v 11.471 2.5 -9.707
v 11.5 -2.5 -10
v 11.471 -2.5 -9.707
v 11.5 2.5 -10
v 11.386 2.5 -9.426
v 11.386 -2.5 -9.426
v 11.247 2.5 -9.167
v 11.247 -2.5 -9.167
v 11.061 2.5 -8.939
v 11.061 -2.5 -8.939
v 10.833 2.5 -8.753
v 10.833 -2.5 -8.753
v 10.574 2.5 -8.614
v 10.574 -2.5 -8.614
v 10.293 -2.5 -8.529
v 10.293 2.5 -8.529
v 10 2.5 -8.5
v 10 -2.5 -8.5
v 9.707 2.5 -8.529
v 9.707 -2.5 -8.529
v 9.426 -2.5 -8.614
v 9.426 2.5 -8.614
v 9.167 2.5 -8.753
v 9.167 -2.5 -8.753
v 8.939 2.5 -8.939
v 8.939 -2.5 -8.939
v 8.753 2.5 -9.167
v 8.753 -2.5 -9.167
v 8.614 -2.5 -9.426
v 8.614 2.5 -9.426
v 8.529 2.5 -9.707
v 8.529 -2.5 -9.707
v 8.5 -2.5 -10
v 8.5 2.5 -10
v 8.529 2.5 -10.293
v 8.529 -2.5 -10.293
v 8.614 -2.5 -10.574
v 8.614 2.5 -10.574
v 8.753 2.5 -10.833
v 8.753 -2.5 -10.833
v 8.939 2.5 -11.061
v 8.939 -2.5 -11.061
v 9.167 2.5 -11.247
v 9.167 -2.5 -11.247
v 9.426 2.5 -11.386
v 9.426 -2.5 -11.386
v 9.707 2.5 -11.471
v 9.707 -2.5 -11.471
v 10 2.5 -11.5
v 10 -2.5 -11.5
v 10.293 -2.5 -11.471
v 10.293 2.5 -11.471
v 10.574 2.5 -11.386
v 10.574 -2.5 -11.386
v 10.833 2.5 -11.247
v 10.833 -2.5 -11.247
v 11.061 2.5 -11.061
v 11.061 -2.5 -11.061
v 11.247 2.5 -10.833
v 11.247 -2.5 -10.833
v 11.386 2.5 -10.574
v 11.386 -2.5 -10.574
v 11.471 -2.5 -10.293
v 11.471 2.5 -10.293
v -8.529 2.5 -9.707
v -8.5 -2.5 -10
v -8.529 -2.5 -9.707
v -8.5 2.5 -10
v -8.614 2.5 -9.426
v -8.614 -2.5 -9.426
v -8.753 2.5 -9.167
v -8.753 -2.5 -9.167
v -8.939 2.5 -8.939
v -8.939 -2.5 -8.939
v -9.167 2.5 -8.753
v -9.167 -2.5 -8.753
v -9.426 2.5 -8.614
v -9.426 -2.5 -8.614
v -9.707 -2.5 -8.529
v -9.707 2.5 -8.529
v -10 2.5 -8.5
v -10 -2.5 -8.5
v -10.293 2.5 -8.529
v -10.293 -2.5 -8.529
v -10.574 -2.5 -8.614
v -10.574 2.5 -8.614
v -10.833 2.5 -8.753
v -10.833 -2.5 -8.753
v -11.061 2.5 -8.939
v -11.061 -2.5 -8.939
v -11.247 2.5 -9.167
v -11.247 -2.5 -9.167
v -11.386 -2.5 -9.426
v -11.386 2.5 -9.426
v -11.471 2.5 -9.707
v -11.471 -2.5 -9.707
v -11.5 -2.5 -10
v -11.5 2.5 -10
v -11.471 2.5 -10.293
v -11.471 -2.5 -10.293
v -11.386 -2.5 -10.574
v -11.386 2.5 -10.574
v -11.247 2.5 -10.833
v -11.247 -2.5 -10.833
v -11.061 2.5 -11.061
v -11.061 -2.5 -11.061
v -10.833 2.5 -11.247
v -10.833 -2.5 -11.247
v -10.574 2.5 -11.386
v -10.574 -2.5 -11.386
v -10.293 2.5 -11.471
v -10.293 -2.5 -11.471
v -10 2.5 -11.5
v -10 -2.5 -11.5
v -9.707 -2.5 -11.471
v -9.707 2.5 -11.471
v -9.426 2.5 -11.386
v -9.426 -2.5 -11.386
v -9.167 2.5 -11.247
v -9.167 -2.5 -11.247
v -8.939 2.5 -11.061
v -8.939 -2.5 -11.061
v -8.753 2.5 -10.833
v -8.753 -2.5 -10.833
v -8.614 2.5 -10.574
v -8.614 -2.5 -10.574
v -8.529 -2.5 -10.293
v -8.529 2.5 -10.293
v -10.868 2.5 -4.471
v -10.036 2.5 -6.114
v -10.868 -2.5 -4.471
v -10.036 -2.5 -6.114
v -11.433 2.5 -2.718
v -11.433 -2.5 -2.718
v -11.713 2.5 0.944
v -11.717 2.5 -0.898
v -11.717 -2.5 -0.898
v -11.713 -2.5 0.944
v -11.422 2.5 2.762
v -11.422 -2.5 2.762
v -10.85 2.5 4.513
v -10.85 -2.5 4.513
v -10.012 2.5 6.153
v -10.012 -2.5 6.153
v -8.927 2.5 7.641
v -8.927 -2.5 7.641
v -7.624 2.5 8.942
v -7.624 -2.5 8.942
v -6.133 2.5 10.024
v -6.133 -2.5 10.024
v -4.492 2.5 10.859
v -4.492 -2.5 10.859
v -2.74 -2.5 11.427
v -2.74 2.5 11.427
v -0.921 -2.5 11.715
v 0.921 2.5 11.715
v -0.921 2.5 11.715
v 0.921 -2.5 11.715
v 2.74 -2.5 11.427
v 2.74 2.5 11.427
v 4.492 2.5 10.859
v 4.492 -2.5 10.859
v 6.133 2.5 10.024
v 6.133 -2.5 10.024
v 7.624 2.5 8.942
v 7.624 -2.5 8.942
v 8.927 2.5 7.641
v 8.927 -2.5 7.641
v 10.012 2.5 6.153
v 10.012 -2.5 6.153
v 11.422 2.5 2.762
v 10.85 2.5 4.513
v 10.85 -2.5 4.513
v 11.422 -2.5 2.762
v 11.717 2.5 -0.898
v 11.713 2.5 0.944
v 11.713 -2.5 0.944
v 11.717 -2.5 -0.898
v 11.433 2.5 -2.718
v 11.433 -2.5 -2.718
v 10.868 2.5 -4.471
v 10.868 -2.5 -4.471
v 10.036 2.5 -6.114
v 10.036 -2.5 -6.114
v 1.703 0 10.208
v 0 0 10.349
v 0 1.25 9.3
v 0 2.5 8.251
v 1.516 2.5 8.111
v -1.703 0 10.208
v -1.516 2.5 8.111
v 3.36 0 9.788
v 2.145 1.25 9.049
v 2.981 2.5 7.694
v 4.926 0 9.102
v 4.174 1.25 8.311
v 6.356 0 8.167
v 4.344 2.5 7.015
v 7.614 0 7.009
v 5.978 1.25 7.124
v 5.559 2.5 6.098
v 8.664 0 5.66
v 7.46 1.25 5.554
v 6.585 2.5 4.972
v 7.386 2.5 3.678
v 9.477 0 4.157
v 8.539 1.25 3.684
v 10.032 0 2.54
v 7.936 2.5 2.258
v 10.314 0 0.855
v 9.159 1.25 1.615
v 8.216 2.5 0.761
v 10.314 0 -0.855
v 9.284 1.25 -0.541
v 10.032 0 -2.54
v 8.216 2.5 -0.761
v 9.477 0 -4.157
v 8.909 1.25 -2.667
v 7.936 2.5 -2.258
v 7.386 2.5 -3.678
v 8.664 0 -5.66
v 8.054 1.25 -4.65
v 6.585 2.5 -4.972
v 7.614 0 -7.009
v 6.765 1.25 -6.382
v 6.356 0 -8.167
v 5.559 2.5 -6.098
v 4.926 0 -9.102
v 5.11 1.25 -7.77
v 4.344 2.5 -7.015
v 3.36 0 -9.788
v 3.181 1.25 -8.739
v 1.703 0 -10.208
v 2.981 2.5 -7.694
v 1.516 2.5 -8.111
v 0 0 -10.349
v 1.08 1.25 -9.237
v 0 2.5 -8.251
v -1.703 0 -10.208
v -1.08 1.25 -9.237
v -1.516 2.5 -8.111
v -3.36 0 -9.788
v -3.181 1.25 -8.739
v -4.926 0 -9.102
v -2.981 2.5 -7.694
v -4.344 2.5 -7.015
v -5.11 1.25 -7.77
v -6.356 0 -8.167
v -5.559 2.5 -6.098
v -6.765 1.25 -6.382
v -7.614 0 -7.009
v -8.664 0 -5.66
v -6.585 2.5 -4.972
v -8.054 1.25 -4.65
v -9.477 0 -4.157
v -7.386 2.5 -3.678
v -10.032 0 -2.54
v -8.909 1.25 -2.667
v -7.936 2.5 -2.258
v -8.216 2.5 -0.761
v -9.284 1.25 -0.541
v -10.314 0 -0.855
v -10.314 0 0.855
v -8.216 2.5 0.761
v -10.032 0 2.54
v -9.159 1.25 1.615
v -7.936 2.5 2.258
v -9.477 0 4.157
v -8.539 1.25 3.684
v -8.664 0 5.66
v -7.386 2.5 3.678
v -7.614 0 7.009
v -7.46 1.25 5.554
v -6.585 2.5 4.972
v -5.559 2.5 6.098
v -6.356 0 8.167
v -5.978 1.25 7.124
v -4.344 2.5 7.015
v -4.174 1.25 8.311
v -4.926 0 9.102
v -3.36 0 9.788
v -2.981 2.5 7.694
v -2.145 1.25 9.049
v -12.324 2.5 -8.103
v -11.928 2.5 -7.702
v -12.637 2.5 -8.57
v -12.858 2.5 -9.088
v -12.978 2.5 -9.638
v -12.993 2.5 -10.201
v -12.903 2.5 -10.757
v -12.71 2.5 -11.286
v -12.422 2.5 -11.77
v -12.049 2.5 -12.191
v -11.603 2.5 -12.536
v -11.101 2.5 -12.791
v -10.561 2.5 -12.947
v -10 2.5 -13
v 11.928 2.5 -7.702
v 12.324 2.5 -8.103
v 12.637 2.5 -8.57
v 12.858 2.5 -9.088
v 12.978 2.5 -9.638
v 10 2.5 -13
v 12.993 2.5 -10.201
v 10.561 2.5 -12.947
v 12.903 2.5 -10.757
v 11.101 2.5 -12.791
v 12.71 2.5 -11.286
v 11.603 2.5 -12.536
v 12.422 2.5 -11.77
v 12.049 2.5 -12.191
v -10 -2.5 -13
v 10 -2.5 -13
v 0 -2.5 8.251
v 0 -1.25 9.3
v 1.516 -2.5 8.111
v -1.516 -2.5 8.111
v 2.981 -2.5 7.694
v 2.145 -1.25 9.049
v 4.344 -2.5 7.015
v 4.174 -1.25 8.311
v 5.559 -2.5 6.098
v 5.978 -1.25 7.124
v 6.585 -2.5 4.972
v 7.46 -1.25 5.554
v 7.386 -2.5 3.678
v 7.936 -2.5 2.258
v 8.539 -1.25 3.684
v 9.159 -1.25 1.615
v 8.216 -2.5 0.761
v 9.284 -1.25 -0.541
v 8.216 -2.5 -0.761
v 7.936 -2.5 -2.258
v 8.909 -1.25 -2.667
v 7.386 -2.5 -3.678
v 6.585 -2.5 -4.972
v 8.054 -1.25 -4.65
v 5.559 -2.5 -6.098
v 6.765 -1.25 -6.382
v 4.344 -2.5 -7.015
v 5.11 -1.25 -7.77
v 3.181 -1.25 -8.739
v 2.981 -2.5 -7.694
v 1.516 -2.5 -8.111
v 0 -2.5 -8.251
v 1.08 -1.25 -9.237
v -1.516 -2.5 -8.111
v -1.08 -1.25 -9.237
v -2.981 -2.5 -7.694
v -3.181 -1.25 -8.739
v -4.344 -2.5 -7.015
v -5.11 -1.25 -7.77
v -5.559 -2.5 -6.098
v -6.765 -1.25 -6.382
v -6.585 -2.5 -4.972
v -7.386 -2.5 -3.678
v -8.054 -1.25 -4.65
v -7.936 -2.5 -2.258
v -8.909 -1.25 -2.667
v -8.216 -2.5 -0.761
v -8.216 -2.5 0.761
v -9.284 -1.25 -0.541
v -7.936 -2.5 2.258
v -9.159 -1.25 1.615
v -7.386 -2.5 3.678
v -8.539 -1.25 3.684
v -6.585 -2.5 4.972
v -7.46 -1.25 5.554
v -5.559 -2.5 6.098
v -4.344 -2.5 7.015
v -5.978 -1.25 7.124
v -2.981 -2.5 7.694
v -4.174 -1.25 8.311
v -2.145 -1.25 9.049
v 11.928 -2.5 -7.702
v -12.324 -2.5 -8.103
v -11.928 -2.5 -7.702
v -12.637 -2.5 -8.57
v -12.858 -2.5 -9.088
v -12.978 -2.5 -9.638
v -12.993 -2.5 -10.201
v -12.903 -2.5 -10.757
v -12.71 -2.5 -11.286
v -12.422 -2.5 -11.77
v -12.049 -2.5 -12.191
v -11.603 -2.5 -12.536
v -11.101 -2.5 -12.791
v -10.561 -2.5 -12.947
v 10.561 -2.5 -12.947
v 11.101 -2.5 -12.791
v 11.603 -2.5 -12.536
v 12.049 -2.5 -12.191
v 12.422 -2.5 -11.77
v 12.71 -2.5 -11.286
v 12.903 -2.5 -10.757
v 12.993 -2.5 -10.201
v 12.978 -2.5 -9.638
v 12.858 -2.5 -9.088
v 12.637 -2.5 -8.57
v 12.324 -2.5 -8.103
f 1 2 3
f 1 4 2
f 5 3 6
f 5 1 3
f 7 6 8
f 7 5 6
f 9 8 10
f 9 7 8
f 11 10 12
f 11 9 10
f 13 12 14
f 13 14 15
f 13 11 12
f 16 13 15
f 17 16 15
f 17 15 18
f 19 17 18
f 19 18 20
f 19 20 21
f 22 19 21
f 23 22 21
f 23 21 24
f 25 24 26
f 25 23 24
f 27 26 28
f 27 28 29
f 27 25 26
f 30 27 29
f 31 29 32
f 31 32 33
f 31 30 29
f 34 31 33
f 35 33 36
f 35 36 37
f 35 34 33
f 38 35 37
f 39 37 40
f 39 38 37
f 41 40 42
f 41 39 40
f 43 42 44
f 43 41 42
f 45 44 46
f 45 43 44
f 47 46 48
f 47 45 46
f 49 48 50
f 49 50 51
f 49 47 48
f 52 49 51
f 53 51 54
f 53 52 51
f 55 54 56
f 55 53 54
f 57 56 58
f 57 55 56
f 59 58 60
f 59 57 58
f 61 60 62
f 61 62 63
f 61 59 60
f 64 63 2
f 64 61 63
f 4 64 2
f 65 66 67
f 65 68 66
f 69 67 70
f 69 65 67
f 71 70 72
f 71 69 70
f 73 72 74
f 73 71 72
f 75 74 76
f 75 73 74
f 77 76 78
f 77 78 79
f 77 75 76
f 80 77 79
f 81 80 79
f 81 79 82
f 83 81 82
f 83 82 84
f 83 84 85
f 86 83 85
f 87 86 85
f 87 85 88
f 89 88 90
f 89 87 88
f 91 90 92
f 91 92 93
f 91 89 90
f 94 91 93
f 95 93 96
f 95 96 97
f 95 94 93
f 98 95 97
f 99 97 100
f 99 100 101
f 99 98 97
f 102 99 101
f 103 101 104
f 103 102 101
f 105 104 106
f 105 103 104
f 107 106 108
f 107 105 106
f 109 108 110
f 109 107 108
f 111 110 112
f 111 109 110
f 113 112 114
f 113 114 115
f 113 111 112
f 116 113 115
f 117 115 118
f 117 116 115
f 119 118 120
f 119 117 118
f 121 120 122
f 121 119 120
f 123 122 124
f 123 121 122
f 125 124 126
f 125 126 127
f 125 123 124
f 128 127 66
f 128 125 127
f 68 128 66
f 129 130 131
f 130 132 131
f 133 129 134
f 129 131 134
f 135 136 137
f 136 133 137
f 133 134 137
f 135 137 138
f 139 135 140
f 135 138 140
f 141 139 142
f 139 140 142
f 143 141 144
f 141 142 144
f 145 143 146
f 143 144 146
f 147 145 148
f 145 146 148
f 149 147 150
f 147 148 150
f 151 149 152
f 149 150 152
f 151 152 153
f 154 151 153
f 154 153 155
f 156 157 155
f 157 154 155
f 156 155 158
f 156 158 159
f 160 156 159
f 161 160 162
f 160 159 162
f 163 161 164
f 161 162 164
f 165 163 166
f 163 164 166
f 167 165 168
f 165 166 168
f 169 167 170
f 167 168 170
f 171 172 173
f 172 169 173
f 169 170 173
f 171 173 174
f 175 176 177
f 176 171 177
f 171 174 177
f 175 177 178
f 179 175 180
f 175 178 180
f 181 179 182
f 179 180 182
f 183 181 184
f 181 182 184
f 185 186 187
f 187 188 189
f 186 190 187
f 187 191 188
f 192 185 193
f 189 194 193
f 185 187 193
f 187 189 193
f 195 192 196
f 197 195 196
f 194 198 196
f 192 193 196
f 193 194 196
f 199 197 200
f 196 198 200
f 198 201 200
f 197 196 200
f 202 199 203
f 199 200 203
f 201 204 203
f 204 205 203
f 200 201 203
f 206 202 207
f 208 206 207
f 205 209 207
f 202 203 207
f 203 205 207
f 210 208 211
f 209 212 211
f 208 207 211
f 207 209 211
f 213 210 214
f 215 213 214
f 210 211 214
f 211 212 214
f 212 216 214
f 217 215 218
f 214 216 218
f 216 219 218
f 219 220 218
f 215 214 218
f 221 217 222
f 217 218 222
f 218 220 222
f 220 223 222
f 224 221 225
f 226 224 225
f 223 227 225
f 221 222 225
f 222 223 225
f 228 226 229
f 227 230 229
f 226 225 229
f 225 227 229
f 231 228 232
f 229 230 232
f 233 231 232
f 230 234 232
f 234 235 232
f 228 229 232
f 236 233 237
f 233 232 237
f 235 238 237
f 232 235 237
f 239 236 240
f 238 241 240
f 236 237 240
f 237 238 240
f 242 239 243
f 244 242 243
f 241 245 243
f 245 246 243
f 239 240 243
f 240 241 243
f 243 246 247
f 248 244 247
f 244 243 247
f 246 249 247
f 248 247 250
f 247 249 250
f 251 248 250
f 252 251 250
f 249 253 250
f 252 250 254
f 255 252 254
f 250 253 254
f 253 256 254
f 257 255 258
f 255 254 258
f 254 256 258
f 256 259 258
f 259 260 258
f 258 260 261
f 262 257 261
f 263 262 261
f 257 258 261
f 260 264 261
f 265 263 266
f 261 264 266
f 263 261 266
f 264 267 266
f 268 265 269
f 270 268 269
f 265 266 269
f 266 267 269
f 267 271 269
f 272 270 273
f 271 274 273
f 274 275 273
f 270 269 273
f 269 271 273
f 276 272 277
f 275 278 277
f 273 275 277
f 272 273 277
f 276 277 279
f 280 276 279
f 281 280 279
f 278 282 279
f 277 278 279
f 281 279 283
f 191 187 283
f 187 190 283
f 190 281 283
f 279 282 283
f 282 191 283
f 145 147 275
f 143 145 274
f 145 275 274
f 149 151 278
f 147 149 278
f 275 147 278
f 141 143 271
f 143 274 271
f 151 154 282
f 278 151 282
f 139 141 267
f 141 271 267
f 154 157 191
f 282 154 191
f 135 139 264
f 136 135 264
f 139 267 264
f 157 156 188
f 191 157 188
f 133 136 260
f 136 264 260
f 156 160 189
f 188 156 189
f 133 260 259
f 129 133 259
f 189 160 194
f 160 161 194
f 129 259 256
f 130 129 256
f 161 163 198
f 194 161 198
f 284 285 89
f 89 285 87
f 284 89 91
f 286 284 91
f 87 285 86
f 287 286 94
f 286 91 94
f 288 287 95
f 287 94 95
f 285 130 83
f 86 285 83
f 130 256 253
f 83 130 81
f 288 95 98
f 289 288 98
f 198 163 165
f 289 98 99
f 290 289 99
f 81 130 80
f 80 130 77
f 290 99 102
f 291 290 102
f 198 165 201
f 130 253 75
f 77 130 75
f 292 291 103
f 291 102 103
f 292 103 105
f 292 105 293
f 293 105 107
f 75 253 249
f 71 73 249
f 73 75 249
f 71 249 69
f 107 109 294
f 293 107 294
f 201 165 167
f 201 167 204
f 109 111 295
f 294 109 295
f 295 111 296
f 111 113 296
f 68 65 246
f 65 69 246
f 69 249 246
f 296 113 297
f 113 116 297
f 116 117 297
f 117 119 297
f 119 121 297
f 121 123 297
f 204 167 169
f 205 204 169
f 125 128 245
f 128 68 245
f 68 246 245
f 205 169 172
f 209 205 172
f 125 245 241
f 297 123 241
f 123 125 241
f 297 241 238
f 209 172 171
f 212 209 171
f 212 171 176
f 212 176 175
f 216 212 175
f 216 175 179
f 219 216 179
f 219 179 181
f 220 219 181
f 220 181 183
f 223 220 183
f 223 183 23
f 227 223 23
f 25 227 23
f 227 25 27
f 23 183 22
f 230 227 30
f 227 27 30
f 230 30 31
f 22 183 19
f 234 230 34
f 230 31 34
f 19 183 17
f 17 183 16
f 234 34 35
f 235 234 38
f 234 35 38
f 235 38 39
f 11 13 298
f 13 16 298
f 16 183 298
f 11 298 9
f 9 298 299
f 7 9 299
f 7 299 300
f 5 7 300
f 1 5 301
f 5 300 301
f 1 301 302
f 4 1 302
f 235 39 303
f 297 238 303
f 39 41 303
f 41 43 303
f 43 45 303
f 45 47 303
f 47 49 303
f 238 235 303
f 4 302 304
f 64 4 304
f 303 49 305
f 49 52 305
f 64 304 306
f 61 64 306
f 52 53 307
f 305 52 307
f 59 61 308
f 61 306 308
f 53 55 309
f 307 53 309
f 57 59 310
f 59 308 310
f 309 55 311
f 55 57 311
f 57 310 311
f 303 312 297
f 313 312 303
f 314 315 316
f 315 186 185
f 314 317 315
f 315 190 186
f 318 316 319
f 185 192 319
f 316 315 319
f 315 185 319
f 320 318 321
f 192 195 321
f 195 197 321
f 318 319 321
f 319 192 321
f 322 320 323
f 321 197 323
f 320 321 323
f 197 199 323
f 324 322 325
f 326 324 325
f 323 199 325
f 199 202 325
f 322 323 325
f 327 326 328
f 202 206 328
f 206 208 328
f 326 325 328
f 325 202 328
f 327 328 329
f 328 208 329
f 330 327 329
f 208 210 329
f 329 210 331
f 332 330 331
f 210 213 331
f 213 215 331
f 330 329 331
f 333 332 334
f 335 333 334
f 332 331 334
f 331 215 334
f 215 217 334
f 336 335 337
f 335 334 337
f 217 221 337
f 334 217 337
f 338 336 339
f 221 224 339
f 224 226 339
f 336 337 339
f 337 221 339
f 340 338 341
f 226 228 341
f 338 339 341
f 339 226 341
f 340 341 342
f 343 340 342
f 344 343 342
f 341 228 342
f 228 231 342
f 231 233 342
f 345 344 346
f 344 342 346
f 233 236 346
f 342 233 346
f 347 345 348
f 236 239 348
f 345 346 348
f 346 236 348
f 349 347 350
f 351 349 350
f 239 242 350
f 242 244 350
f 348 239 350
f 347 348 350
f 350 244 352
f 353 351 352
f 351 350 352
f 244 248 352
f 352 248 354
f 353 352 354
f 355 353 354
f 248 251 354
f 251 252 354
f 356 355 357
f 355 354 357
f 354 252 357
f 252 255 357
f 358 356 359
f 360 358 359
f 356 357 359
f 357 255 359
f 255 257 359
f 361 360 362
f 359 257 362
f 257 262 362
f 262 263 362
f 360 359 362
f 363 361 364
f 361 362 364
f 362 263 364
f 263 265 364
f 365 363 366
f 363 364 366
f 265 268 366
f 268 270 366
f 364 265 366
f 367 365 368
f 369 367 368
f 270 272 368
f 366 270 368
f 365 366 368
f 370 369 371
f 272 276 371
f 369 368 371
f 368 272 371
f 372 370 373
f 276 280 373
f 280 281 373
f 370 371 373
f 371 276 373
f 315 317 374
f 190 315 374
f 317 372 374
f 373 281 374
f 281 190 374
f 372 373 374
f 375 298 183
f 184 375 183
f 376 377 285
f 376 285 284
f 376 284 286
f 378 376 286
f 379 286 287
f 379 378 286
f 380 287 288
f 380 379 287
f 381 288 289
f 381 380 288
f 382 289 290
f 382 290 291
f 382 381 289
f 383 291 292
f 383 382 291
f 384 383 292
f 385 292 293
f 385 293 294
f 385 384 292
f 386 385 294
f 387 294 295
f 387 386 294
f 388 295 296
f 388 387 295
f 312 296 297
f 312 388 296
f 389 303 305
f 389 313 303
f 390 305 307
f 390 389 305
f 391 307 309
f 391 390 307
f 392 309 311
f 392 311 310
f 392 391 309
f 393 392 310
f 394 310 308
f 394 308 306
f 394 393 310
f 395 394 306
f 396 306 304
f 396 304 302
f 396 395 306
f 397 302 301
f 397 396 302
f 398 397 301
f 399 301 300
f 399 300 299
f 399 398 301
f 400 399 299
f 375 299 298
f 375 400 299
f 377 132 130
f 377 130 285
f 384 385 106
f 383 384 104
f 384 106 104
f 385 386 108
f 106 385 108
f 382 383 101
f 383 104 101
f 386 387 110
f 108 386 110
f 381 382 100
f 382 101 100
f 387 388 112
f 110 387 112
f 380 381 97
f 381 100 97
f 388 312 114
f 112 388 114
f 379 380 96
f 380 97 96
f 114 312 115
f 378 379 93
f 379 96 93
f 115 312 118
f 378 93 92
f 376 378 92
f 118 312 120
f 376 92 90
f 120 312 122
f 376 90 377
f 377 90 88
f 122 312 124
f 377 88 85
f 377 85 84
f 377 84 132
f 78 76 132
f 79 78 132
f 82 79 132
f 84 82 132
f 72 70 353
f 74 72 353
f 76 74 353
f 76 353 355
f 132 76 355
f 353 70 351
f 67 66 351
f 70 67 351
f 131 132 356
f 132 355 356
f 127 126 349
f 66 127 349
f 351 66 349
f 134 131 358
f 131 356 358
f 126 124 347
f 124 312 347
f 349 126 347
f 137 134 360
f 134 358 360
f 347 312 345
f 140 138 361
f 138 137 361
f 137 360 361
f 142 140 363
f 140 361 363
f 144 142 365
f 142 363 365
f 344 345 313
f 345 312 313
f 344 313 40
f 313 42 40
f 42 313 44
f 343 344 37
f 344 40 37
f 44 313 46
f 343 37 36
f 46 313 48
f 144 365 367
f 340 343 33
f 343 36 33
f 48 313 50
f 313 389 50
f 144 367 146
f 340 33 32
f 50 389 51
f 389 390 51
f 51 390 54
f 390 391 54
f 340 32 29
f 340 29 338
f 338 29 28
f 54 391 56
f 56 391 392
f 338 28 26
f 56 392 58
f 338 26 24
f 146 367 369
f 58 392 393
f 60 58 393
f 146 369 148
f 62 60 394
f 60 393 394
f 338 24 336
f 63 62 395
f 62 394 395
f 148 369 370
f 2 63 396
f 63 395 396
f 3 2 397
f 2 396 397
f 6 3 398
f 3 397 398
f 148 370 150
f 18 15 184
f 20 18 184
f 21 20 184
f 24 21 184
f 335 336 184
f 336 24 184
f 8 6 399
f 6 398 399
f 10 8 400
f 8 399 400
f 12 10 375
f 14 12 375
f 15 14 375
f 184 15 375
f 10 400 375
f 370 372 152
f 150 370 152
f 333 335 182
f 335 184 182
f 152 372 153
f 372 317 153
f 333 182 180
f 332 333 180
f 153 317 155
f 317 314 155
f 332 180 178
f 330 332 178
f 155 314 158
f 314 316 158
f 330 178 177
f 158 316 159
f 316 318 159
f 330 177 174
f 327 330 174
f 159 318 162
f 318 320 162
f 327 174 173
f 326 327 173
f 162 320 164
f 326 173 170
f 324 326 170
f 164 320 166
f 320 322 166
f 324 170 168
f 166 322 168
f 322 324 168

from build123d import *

# Parameters (mm, degrees)
SKETCH017_R  = 1.5
PAD008_DEPTH = 2.5


with BuildPart() as outerbearing:
    # Sketch007 → Revolution001 (revolve)
    with BuildSketch(Plane.YZ):
        Polygon((-2.5, 8.251111), (0, 10.34886), (2.5, 8.251111), (2.5, 11.751111), (-2.5, 11.751111), align=None)
    revolve(axis=Axis((0, 0, 0), (0, 1, 0)))


with BuildPart() as fusion001:
    # Sketch017 → Pad008 (new body, symmetric)
    with BuildSketch(Plane.XZ):
        with BuildLine():
            ThreePointArc((-9.84093, -5.950302), (0, -11.5), (9.84093, -5.950302))
            Line((11.928352, -7.701857), (9.84093, -5.950302))
            ThreePointArc((9.999998, -13), (12.81908, -11.026055), (11.928352, -7.701857))
            Line((-10, -13), (9.999998, -13))
            ThreePointArc((-11.928369, -7.701871), (-12.819077, -11.026064), (-10, -13))
            Line((-9.84093, -5.950302), (-11.928369, -7.701871))
        make_face()
        with Locations((10, -10)):
            Circle(SKETCH017_R, mode=Mode.SUBTRACT)
        with Locations((-10, -10)):
            Circle(SKETCH017_R, mode=Mode.SUBTRACT)
    extrude(amount=PAD008_DEPTH, both=True)

    # Fusion001: union OuterBearing
    add(outerbearing.part)


solid = fusion001.part
